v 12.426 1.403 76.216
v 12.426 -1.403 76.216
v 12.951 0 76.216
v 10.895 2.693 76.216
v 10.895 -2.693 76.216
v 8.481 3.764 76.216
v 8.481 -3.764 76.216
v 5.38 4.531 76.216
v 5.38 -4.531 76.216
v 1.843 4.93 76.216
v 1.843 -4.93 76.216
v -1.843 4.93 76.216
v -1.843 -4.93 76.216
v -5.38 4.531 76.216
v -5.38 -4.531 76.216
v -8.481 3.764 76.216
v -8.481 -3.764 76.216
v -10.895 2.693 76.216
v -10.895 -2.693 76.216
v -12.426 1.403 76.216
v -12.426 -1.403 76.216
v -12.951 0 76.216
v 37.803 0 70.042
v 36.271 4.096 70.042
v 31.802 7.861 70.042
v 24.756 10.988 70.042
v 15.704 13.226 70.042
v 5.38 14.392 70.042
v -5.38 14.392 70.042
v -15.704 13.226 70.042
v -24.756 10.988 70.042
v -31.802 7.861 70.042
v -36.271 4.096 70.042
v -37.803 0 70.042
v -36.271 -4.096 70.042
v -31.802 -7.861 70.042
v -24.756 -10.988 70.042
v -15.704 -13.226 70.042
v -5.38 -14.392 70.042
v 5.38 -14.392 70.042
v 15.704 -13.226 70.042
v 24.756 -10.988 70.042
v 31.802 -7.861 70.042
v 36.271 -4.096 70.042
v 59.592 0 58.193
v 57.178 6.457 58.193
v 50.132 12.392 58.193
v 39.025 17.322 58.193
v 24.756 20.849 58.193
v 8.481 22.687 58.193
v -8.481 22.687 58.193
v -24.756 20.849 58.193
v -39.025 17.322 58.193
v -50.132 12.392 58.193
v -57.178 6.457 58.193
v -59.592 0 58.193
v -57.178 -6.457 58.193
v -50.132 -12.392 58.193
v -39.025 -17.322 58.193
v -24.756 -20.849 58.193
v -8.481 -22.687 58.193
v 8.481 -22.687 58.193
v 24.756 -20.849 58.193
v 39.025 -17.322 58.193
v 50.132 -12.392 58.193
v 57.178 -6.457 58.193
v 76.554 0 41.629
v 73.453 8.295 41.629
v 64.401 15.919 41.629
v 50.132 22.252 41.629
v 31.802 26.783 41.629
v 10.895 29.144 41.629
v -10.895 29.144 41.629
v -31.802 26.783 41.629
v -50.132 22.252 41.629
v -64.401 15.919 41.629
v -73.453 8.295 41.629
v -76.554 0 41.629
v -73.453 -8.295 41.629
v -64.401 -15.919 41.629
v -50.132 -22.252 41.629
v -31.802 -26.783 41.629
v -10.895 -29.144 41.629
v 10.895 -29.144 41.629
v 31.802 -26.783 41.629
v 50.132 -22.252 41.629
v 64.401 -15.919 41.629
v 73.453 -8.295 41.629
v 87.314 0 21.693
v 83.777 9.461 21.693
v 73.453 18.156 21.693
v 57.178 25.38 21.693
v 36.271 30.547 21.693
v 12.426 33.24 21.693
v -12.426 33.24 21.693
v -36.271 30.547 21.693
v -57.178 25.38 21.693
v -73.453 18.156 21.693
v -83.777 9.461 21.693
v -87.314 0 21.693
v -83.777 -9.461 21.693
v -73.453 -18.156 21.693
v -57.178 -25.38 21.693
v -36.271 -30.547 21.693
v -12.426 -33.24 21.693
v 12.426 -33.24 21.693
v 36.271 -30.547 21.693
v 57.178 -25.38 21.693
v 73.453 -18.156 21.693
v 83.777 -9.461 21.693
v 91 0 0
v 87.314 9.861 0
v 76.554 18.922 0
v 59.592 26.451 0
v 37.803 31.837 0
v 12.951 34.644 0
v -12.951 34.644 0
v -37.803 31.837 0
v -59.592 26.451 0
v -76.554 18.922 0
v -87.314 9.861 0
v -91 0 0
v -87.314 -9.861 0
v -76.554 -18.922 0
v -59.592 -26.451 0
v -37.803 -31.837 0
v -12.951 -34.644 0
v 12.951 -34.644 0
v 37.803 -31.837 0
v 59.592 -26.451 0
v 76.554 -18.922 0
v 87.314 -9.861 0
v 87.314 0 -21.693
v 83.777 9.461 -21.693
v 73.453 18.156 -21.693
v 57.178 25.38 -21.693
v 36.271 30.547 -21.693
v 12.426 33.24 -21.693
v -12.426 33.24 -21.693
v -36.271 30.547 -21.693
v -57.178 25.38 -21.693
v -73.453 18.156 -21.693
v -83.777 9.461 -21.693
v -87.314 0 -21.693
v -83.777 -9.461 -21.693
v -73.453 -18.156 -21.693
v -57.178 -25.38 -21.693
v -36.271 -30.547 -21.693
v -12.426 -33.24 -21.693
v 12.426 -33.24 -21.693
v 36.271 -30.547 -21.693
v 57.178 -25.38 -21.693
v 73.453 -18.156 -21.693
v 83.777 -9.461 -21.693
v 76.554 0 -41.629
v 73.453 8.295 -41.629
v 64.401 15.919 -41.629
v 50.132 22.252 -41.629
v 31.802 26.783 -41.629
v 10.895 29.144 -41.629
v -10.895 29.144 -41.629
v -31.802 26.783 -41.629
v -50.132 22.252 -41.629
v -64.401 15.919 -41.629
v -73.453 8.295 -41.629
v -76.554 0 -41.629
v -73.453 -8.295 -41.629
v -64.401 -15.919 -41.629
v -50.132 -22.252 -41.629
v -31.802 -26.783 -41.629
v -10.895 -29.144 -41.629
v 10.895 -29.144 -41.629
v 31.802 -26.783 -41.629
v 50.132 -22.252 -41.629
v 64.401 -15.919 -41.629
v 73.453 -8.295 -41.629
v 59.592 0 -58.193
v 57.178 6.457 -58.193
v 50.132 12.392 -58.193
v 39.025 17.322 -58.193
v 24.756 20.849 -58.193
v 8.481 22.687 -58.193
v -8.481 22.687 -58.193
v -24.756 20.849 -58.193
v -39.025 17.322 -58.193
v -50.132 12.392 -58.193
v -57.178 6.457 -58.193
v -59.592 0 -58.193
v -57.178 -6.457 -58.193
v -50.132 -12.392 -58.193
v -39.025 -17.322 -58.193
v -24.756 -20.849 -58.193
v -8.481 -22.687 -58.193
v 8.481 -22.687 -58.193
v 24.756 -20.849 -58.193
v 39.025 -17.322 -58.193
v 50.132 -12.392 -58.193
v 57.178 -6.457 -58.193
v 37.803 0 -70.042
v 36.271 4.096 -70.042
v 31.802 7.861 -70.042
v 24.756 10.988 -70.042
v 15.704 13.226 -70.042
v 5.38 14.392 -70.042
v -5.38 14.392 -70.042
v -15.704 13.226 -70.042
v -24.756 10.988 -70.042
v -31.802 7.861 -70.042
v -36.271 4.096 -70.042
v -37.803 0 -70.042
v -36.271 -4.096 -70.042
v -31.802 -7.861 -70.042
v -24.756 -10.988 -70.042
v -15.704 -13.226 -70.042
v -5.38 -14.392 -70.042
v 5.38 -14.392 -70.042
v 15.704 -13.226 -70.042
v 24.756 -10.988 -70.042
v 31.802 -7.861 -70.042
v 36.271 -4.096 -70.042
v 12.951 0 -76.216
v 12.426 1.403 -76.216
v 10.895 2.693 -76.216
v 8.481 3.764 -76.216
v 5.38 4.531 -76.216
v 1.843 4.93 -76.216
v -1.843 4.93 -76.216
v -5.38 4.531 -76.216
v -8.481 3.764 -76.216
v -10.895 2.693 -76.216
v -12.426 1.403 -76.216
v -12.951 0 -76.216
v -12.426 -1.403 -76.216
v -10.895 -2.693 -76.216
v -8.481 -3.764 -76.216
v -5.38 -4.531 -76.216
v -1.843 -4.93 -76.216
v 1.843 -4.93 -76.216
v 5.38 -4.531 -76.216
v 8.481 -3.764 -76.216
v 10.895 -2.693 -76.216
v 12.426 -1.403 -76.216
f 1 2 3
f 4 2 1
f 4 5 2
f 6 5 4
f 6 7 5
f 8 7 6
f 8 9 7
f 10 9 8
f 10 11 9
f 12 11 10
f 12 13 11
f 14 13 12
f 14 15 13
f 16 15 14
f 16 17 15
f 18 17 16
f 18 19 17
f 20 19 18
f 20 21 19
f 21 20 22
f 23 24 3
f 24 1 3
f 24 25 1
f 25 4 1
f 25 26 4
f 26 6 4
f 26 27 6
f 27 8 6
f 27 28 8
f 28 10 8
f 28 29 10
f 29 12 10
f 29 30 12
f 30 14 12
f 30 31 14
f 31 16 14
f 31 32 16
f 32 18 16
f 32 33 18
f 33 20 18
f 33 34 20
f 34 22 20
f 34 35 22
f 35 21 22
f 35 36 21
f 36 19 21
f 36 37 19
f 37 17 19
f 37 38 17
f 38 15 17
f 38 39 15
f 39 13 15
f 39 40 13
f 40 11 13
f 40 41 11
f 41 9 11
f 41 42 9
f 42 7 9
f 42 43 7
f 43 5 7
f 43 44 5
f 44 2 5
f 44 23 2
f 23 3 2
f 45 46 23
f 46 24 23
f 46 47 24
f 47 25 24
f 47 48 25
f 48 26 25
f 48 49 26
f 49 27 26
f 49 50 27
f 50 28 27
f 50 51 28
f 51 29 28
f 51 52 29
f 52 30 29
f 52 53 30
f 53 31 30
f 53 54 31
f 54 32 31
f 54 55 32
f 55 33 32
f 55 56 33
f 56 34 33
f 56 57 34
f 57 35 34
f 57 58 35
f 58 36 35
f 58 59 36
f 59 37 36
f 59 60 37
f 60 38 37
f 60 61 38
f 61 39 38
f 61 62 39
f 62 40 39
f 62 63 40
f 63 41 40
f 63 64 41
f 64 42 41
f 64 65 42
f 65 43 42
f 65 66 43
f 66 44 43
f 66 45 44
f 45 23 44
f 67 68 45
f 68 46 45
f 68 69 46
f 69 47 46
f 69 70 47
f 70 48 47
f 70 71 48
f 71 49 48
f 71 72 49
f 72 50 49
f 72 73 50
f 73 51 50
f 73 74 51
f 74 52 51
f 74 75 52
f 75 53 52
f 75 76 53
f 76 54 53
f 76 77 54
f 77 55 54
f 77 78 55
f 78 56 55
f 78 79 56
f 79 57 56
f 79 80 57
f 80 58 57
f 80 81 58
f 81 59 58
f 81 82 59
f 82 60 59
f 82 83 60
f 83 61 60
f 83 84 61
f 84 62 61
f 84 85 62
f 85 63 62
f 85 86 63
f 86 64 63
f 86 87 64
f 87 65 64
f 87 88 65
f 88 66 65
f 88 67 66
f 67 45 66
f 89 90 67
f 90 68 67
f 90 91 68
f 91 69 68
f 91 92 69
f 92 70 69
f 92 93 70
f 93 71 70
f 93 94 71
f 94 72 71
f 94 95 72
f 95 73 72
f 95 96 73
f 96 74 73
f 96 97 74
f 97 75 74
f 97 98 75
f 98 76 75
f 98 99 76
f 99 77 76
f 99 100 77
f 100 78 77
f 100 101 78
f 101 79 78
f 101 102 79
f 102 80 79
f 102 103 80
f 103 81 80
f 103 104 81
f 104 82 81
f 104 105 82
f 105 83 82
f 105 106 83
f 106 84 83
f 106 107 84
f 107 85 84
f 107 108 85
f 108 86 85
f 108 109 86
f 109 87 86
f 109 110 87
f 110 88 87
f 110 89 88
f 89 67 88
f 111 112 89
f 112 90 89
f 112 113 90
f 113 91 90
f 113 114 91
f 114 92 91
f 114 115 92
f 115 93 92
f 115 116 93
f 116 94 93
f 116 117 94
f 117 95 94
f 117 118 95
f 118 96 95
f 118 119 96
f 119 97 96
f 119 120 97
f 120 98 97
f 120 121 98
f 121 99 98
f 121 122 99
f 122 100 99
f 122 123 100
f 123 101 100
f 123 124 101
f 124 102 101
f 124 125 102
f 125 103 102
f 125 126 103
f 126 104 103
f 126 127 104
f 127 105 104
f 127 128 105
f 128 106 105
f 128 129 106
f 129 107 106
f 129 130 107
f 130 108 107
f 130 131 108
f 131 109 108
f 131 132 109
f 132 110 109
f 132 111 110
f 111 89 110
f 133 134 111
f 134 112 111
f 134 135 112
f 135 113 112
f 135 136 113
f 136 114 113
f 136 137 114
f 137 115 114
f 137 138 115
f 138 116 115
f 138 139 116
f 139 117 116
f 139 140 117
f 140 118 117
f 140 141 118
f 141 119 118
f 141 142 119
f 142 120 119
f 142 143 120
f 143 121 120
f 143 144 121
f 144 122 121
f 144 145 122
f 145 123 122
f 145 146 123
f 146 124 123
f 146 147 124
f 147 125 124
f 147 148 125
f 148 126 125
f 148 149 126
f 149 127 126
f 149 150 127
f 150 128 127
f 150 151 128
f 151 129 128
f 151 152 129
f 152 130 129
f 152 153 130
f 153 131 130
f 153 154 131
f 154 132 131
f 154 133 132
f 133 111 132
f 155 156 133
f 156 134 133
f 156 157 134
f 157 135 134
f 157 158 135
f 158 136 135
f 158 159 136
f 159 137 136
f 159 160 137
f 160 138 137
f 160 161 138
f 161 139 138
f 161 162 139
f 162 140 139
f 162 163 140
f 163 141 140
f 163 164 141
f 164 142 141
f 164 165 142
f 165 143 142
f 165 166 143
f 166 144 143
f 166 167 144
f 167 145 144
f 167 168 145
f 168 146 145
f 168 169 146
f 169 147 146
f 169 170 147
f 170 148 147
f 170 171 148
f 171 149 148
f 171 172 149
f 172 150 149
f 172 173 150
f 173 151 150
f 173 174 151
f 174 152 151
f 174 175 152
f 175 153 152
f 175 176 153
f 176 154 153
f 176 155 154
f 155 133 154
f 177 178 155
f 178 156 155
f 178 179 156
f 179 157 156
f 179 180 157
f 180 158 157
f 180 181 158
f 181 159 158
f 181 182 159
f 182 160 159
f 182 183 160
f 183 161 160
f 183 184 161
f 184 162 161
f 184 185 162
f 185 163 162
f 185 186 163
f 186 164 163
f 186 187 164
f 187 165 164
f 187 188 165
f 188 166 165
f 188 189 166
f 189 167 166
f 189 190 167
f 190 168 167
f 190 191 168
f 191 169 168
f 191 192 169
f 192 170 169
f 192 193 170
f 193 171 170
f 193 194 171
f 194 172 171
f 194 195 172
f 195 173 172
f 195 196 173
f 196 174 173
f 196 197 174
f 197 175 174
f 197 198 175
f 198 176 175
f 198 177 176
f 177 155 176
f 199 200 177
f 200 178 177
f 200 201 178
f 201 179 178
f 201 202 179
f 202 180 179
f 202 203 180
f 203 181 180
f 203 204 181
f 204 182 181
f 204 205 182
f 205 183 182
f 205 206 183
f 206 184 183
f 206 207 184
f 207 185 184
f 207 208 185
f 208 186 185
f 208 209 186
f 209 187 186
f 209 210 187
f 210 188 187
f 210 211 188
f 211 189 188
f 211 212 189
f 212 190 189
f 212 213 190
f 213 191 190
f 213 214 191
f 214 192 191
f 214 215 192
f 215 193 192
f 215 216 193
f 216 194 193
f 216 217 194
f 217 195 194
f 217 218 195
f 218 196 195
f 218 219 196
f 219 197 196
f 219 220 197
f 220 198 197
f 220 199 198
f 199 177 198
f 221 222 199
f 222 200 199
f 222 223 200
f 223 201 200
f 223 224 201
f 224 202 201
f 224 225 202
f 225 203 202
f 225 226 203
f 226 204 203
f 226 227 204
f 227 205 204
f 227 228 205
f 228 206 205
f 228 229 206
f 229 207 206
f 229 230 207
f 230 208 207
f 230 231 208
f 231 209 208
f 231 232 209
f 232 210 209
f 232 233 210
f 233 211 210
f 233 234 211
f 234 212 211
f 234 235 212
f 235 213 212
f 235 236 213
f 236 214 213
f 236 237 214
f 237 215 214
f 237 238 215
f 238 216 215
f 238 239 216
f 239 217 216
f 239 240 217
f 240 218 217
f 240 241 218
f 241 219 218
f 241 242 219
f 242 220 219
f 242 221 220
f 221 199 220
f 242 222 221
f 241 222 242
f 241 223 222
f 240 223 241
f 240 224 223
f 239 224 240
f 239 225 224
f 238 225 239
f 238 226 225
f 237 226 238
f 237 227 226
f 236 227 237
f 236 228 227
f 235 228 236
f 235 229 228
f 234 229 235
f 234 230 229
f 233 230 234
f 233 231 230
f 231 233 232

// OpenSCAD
// Generated by SolidPython 1.0.1 on 2020-07-29 00:46:50


scale(v = [13, 5, 11]) {
	sphere(r = 7);
}
/***********************************************
*********      SolidPython code:      **********
************************************************
 
# import packages: SolidPython
from solid import *
from solid.utils import *
from itertools import chain, combinations, permutations


class Resize:

    def __init__(self, scad_file):
        self.scad_file = scad_file
        #self.scad_file = import_scad(scad_file)
        # cone/cylinder param:
        self.r1 = 0
        self.r2 = 0
        self.h = 0
        # rectangular prism param:
        self.w = 0
        self.l = 0
        # ellipse param:
        self.r = 0

    # import OpenScad code (file name corresponds to shape)


    # classify shape + parameters
    def assign(self, param1, param2, param3):
        if self.scad_file == 'cone.scad':
            self.r1 = param1
            self.r2 = param2
            self.h = param3
        elif self.scad_file == 'cylinder.scad':
            self.r1 = param1
            self.r2 = param2
            self.h = param3
        elif self.scad_file == 'rectangularPrism.scad':
            self.h = param1
            self.l = param2
            self.w = param3
        else:
            self.r = param1
            self.h = param2

    # resize parameters
    def iterate(self):
        x = range(3, 20, 2)
        i = 1
        if self.scad_file == 'cone.scad':
            tempList = list(permutations(x, 2))
            for temp in tempList:
                param1 = temp[0]
                param2 = temp[1]
                filepath = 'produced_scad_files/' + 'cone' + str(param1) + '_' + str(param2) + '_' + '.scad'
                scad_render_to_file(cylinder(h=param1, r1=param2, r2=0), filepath)

        elif self.scad_file == 'cylinder.scad':
            tempList = list(permutations(x, 3))
            for temp in tempList:
                param1 = temp[0]
                param2 = temp[1]
                filepath = 'produced_scad_files/' + 'cylinder' + str(param1) + '_' + str(param2) + '_' + '.scad'
                scad_render_to_file(cylinder(h=param1, r1=param2, r2=param2), filepath)

        elif self.scad_file == 'rectangularPrism.scad':
            tempList = list(permutations(x, 3))
            for temp in tempList:
                param1 = temp[0]
                param2 = temp[1]
                param3 = temp[2]
                filepath = 'produced_scad_files/' + 'rectangularPrism' + str(param1) + '_' + str(param2) + '_' + str(
                    param3) + '.scad'
                scad_render_to_file(cube(size=(param1, param2, param3)), filepath)

        elif self.scad_file == 'ellipse.scad':
            tempList = list(permutations(x, 4))
            for temp in tempList:
                param1 = temp[0]
                param2 = temp[1]
                param3 = temp[2]
                param4 = temp[3]
                filepath = 'produced_scad_files/' + 'ellipse' + str(param1) + '_' + str(param2) + '_' + str(param3) + '_' + str(param4) + '.scad'
                scad_render_to_file(scale([param1, param2, param3])(sphere(r=param4)), filepath)

    def render_to_scadfile(self):
        scad_render_to_file(scad, 'example.scad') 
 
************************************************/
